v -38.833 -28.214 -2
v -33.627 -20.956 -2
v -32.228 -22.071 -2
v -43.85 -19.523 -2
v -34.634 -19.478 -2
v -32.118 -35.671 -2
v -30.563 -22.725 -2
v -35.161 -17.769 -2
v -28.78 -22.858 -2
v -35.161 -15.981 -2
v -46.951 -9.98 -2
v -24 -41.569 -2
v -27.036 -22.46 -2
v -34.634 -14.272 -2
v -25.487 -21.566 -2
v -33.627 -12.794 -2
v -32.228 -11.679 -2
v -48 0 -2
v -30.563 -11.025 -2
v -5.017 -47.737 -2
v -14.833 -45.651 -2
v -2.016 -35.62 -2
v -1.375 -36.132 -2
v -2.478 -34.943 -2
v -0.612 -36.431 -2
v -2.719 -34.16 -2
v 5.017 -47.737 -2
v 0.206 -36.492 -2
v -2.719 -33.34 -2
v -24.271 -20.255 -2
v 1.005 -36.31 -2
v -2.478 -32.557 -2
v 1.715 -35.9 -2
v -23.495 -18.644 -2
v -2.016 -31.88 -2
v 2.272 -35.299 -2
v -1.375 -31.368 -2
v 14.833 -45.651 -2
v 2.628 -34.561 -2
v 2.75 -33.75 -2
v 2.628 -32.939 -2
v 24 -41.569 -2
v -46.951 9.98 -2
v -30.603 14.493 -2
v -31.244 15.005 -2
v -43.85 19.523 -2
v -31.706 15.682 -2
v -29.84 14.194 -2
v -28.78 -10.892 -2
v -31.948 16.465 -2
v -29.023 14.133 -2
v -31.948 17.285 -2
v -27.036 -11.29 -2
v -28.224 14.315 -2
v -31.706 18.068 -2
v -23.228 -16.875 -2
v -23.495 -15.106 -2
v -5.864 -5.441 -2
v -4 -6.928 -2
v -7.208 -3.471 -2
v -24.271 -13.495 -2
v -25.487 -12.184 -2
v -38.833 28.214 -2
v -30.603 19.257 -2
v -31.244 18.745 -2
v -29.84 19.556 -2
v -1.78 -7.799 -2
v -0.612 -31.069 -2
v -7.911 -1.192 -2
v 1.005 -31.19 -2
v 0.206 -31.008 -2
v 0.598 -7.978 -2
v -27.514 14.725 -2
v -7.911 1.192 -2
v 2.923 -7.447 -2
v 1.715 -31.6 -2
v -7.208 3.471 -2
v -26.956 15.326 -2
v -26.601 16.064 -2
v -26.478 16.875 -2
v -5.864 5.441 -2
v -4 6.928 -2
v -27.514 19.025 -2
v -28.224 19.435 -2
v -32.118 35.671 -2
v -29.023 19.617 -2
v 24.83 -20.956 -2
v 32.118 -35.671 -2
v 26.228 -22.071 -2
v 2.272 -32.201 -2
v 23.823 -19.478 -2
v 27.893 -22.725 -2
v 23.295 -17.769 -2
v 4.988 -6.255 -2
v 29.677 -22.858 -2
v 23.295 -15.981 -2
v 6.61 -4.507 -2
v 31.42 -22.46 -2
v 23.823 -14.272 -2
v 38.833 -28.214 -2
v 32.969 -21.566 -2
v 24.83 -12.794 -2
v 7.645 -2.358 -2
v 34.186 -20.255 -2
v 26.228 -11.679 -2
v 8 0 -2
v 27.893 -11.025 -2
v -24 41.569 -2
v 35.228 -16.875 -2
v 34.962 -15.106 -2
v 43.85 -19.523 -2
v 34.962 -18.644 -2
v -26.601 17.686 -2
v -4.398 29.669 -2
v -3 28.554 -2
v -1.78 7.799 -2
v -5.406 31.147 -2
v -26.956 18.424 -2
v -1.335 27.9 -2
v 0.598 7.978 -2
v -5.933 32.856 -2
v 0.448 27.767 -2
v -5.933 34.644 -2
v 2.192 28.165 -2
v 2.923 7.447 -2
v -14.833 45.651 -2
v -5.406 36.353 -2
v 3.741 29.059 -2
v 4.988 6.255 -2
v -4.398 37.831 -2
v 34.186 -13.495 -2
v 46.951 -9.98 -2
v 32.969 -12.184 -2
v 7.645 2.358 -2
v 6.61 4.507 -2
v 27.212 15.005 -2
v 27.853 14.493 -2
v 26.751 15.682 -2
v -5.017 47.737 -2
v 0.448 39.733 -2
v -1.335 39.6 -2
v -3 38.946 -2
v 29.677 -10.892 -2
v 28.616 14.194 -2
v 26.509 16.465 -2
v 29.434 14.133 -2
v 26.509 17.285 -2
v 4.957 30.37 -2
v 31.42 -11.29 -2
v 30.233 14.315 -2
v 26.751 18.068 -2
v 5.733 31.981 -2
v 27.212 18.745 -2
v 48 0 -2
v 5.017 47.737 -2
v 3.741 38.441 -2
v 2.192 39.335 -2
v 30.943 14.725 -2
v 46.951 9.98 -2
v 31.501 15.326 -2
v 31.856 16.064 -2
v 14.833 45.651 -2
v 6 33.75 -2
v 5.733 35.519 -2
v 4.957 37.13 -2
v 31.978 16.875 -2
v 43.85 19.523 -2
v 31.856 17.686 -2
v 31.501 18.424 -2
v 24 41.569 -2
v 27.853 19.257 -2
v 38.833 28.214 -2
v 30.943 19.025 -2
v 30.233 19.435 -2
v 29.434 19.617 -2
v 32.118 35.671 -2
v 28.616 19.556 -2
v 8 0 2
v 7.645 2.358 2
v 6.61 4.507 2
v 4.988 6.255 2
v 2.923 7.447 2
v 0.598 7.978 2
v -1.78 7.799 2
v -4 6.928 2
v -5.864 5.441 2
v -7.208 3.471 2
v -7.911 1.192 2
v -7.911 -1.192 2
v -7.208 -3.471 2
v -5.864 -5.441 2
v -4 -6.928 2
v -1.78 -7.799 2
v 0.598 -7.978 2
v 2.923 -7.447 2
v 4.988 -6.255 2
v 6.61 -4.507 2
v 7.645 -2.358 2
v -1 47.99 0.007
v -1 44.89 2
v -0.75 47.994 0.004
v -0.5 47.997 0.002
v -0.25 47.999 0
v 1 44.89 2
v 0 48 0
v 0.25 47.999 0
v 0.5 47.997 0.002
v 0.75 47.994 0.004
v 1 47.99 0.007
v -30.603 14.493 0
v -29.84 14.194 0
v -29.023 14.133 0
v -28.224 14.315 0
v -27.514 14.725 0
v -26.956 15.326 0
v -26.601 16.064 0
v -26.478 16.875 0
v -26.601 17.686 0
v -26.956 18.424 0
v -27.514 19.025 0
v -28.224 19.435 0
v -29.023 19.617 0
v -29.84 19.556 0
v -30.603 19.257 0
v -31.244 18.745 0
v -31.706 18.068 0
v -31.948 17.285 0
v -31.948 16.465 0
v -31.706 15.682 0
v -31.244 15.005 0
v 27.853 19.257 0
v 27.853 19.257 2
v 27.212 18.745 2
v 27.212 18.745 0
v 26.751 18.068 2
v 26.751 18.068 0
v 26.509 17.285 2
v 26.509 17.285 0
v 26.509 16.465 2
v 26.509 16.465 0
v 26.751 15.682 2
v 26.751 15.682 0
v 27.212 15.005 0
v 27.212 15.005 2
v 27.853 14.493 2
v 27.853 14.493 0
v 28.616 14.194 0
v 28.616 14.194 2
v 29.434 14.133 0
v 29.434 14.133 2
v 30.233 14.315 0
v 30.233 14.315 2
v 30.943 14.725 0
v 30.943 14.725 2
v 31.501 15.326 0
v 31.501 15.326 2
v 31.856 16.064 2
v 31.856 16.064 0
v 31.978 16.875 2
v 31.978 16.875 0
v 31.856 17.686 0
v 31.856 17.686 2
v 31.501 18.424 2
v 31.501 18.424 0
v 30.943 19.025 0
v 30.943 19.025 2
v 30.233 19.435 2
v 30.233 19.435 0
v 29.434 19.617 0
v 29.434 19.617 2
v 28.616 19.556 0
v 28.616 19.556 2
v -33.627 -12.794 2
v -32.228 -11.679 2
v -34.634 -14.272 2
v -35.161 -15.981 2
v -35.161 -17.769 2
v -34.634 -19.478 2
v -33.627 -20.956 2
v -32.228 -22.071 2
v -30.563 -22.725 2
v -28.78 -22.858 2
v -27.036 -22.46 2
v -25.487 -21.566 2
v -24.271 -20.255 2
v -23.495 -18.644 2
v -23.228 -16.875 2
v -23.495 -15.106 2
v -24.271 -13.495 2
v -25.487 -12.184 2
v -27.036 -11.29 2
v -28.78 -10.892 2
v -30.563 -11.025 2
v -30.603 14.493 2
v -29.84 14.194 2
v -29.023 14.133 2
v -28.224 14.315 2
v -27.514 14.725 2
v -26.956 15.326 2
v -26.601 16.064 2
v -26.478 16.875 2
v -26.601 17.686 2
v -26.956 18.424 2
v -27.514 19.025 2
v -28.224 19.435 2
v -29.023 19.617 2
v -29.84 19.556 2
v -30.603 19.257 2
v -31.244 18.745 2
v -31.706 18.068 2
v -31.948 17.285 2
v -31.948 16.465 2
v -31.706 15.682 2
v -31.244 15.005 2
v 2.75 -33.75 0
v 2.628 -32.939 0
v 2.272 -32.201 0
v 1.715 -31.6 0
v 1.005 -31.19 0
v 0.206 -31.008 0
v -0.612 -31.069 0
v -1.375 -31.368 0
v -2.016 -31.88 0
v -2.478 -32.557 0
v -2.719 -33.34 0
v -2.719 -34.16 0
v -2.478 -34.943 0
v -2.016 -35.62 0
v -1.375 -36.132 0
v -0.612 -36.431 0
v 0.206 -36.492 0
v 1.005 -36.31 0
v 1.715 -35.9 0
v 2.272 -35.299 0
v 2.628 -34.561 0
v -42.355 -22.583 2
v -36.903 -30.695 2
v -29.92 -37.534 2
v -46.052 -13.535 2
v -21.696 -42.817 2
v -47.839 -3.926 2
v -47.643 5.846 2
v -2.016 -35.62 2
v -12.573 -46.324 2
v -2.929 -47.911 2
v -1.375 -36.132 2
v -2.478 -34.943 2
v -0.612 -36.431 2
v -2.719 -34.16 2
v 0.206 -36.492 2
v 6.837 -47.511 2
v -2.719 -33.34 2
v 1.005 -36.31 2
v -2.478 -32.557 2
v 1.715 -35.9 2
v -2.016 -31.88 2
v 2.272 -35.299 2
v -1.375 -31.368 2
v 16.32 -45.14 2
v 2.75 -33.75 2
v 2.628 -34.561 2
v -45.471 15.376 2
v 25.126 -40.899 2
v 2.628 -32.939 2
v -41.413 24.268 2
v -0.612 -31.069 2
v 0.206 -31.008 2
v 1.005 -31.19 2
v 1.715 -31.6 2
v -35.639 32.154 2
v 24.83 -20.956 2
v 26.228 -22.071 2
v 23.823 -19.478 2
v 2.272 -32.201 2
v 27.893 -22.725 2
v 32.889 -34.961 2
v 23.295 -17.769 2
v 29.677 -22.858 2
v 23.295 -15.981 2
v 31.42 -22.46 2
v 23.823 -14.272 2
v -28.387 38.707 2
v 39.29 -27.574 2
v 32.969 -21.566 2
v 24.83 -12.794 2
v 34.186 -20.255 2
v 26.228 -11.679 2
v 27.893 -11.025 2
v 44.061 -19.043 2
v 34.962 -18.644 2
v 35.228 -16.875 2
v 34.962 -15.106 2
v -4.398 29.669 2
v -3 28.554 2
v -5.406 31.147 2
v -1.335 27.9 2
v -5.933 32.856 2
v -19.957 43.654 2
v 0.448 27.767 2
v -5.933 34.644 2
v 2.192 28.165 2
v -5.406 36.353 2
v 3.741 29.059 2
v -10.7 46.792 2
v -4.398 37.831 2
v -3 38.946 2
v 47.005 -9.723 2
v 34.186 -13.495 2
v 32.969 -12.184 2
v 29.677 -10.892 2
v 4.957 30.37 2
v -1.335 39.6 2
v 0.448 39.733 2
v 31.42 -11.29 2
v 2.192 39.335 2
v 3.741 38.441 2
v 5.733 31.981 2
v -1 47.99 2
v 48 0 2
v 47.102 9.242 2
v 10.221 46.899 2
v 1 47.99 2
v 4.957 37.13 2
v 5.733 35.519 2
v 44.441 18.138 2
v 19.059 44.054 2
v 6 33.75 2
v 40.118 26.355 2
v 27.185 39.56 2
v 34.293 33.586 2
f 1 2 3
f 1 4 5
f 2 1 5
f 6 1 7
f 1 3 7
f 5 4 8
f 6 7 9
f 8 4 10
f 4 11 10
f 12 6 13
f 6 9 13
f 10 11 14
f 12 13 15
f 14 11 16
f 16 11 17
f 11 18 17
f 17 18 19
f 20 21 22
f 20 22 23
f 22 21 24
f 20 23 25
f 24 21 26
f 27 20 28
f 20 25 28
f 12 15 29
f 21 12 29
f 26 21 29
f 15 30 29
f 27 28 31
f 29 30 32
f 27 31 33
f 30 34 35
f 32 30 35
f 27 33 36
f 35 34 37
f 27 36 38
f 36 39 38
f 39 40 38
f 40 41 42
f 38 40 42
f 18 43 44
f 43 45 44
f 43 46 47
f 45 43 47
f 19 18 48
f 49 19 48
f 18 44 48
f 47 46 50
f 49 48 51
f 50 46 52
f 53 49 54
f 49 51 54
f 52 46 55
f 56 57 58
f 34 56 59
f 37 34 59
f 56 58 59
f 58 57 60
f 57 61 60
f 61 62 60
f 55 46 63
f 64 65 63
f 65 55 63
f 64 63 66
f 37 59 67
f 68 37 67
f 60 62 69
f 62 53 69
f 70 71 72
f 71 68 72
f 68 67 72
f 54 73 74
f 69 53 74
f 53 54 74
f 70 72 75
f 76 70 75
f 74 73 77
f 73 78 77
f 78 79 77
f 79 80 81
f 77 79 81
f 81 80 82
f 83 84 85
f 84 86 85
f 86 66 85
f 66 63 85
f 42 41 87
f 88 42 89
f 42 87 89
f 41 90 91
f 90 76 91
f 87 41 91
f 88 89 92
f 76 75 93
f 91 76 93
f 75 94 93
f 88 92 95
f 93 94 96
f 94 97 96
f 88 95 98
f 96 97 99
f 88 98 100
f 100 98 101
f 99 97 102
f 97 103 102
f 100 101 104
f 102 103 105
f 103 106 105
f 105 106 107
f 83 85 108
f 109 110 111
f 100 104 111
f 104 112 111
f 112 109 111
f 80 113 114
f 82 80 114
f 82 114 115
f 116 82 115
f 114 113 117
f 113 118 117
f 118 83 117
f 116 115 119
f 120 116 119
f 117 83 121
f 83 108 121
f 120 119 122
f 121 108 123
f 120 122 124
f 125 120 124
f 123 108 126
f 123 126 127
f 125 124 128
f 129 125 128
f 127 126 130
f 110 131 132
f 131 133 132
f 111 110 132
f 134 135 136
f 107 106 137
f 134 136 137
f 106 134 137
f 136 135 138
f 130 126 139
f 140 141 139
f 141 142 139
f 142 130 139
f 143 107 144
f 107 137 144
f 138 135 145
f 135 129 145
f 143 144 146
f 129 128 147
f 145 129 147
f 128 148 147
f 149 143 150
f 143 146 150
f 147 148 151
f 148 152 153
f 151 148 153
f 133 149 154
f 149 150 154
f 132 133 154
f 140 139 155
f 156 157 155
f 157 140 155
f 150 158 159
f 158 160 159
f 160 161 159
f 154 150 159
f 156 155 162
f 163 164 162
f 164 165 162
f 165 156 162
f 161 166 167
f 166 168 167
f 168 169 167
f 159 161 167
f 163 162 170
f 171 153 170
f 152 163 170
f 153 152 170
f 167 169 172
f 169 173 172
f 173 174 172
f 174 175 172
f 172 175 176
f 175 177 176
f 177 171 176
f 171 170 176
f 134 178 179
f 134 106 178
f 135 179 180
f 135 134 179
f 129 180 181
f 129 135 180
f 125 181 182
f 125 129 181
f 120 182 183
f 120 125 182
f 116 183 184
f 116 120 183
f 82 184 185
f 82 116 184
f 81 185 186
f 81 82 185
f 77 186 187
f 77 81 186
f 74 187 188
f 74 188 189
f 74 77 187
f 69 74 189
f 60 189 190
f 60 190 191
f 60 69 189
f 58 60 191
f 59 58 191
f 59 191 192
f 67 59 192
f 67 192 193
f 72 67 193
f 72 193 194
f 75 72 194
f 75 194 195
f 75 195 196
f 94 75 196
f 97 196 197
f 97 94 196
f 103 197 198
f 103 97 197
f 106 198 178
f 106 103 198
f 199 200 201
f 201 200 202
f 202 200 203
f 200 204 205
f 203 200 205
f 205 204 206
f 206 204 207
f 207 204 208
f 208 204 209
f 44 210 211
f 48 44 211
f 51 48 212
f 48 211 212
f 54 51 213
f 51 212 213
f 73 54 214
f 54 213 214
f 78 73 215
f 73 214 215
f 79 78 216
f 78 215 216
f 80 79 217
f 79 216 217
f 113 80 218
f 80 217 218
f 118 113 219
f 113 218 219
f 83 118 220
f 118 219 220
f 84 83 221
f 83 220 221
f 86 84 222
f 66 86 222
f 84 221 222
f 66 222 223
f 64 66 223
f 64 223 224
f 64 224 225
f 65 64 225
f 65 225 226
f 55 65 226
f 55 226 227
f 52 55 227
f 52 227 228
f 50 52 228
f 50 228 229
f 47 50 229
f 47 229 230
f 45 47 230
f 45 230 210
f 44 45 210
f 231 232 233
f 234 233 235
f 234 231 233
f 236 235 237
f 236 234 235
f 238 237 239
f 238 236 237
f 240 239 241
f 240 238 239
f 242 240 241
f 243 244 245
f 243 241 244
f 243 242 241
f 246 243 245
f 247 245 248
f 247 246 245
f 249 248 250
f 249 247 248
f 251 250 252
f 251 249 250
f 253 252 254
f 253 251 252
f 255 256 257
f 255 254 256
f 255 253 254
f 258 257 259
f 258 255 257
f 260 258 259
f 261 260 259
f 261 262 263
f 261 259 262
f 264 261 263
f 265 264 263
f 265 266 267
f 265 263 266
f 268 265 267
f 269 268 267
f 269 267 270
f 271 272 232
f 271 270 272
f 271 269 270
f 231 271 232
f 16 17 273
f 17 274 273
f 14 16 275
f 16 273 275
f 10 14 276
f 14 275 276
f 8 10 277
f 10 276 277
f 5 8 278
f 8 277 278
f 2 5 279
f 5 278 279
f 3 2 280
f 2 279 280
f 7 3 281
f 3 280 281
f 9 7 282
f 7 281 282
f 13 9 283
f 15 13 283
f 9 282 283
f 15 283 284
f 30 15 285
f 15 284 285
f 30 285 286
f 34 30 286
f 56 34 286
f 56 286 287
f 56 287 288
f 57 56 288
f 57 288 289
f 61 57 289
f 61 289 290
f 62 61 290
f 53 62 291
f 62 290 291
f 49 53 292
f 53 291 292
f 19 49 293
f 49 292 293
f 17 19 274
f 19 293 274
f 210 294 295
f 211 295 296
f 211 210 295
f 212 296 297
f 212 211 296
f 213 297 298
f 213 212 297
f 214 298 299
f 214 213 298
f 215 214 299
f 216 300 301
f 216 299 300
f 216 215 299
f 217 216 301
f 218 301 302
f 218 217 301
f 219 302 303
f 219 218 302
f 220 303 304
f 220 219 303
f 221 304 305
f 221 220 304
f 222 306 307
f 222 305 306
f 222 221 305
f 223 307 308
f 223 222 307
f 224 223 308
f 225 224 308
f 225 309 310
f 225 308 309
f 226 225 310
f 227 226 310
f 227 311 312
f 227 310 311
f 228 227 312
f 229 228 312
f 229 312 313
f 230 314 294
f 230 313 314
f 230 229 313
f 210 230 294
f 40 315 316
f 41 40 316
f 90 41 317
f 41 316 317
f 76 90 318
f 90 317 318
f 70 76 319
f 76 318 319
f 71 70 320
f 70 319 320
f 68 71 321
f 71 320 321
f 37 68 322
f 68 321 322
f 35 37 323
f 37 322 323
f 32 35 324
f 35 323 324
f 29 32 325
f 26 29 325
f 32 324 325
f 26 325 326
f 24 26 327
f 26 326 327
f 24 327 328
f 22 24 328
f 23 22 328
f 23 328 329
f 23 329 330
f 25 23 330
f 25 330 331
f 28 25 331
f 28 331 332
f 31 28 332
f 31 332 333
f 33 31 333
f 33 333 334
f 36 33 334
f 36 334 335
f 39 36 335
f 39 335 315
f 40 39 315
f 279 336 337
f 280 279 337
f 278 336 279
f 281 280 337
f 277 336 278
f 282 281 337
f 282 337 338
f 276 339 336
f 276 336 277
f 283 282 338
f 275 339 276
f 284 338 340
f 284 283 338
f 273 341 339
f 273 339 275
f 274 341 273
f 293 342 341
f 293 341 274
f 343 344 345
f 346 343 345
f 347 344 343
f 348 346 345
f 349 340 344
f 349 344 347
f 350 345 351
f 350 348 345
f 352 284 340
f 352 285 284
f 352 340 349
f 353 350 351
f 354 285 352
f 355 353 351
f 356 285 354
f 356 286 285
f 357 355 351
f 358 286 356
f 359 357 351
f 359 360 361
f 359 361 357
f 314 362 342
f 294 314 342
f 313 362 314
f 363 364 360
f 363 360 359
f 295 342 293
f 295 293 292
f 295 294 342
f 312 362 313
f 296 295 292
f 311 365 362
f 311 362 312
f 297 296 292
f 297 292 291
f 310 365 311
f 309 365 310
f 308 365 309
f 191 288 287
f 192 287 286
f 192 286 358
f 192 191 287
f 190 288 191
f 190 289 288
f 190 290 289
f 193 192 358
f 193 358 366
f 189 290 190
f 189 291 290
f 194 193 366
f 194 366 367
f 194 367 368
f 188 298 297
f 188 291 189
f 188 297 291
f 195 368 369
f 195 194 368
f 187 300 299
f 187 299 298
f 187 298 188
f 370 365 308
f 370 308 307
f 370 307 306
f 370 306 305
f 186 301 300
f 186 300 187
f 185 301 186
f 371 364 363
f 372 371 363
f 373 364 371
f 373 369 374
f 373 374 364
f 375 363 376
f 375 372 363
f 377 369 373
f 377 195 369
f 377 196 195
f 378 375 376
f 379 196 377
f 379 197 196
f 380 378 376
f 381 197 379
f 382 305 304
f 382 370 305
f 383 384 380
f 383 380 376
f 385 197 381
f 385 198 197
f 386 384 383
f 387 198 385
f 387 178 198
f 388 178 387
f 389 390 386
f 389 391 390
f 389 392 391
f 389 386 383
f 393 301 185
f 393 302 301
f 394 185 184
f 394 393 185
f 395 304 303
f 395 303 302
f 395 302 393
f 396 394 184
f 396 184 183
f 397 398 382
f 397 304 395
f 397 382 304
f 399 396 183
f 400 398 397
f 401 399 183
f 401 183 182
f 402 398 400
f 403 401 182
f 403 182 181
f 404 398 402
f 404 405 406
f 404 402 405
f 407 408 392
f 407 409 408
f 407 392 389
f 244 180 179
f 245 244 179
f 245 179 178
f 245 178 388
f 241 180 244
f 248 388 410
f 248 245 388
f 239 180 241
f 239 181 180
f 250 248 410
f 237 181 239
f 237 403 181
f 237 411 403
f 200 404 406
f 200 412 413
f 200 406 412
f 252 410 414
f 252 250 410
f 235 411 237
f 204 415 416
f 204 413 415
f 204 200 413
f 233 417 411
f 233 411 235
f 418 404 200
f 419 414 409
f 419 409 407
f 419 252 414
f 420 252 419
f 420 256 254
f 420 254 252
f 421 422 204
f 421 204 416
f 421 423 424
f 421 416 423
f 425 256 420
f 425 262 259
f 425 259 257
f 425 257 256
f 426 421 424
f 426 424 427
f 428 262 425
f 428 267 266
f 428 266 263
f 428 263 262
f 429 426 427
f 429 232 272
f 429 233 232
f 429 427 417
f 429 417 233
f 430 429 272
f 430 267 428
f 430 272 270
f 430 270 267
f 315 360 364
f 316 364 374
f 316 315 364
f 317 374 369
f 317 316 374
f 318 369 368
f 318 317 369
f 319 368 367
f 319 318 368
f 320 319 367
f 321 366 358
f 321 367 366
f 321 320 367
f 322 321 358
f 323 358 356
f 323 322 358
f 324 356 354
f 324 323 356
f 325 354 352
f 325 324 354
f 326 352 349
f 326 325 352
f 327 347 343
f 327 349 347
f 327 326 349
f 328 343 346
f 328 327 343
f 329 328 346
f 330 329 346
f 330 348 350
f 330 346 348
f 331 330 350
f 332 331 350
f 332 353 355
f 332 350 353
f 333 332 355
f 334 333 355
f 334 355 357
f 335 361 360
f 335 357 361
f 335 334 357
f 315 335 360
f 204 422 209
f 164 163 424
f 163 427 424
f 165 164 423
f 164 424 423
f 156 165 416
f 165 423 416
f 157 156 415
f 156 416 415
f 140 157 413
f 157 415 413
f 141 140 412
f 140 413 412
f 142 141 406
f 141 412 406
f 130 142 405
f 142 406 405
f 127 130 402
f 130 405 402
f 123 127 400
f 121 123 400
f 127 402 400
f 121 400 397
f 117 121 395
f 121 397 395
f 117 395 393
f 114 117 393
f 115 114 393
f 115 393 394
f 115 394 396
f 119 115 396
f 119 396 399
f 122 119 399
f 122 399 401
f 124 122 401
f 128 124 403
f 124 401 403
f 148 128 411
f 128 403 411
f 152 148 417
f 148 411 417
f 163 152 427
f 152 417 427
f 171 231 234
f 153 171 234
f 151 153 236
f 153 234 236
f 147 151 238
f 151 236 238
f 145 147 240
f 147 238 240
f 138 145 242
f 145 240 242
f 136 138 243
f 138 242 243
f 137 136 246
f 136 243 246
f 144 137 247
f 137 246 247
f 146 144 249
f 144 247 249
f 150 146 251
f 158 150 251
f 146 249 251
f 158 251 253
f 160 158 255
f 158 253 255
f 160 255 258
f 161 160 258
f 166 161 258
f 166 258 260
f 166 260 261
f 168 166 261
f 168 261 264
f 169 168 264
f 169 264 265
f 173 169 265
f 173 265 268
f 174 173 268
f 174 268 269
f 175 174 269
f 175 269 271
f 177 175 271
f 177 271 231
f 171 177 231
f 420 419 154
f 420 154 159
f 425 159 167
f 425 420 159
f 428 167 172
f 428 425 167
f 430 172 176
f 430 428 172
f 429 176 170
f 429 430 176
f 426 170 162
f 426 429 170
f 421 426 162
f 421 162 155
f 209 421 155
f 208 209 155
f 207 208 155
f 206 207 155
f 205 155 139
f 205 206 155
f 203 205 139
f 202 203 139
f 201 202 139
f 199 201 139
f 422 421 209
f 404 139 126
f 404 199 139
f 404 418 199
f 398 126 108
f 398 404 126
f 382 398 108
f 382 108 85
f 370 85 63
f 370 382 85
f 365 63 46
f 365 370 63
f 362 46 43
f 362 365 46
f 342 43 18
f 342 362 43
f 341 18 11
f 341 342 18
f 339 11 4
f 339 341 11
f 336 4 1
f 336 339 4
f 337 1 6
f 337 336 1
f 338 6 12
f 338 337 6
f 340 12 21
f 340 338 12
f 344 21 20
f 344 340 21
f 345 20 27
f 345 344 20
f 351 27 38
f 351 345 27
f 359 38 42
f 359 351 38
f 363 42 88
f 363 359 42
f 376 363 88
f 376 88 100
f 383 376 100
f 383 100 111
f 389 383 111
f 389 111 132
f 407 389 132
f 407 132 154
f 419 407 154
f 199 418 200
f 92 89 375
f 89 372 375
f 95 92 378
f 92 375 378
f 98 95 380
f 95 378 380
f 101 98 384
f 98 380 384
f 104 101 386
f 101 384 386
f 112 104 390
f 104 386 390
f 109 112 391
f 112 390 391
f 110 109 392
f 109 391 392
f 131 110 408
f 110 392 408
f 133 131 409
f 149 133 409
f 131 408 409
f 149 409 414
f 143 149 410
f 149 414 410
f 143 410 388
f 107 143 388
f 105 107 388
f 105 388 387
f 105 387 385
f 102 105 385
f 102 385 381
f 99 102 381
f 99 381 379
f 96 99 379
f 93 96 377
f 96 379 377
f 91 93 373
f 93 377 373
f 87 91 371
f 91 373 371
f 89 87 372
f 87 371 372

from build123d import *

# Parameters (mm, degrees)
SKETCH1_R                        = 48
SKETCH1_R_2                      = 8
EX_CARRIER_FRONT_PLATE_4MM_DEPTH = 2
SKETCH2_R                        = 6
CUT_PIN_HOLE_12_DEPTH            = 69
PAT_PIN_HOLES_3X120_COUNT        = 3
CUT_EXTRUDE1_DEPTH               = 1
SKETCH4_R                        = 2.75
CUT_EXTRUDE2_DEPTH               = 68.911707385
SKETCH5_R                        = 2.75
CUT_EXTRUDE3_DEPTH               = 68.911707385
CIRPATTERN1_COUNT                = 3
CIRPATTERN2_COUNT                = 3


with BuildPart() as part:
    # Sketch1 → EX_Carrier_Front_Plate_4mm (new, symmetric)
    with BuildSketch(Plane.XY):
        Circle(SKETCH1_R)
        Circle(SKETCH1_R_2, mode=Mode.SUBTRACT)
    extrude(amount=EX_CARRIER_FRONT_PLATE_4MM_DEPTH, both=True)

    # Sketch2 → CUT_Pin_Hole_Ø12 (cut, symmetric)
    with BuildSketch(Plane.XY.offset(2)):
        with Locations((0, 33.75)):
            Circle(SKETCH2_R)
    cut_pin_hole_12 = extrude(amount=CUT_PIN_HOLE_12_DEPTH, both=True, mode=Mode.SUBTRACT)

    # PAT_Pin_Holes_3x120: CUT_Pin_Hole_Ø12 ×3 about axis
    pat_pin_holes_3x120_axis = Axis((0, 0, 0), (0, 0, 1))
    for i in range(1, PAT_PIN_HOLES_3X120_COUNT):
        add(cut_pin_hole_12.rotate(pat_pin_holes_3x120_axis, i * 360 / PAT_PIN_HOLES_3X120_COUNT), mode=Mode.SUBTRACT)

    # Sketch3 → Cut-Extrude1 (cut, symmetric)
    with BuildSketch(Plane(origin=(0, 0, 0), x_dir=(0, 0, -1), z_dir=(1, 0, 0))):
        Polygon((-2, 44.889744608), (0, 48), (-2, 48), align=None)
    extrude(amount=CUT_EXTRUDE1_DEPTH, both=True, mode=Mode.SUBTRACT)

    # Sketch4 → Cut-Extrude2 (cut, through all)
    with BuildSketch(Plane.XY):
        with Locations((0, -33.75)):
            Circle(SKETCH4_R)
    cut_extrude2 = extrude(amount=CUT_EXTRUDE2_DEPTH, mode=Mode.SUBTRACT)

    # Sketch5 → Cut-Extrude3 (cut, through all)
    with BuildSketch(Plane.XY):
        with Locations((0, -33.75)):
            Circle(SKETCH5_R)
    cut_extrude3 = extrude(amount=-CUT_EXTRUDE3_DEPTH, mode=Mode.SUBTRACT)

    # CirPattern1: Cut-Extrude2 ×3 about axis
    cirpattern1_axis = Axis((0, 0, 0), (0, 0, 1))
    for i in range(1, CIRPATTERN1_COUNT):
        add(cut_extrude2.rotate(cirpattern1_axis, i * 360 / CIRPATTERN1_COUNT), mode=Mode.SUBTRACT)

    # CirPattern2: Cut-Extrude3 ×3 about axis
    cirpattern2_axis = Axis((0, 0, -2.208265016), (0, 0, 1))
    for i in range(1, CIRPATTERN2_COUNT):
        add(cut_extrude3.rotate(cirpattern2_axis, i * 360 / CIRPATTERN2_COUNT), mode=Mode.SUBTRACT)


solid = part.part
